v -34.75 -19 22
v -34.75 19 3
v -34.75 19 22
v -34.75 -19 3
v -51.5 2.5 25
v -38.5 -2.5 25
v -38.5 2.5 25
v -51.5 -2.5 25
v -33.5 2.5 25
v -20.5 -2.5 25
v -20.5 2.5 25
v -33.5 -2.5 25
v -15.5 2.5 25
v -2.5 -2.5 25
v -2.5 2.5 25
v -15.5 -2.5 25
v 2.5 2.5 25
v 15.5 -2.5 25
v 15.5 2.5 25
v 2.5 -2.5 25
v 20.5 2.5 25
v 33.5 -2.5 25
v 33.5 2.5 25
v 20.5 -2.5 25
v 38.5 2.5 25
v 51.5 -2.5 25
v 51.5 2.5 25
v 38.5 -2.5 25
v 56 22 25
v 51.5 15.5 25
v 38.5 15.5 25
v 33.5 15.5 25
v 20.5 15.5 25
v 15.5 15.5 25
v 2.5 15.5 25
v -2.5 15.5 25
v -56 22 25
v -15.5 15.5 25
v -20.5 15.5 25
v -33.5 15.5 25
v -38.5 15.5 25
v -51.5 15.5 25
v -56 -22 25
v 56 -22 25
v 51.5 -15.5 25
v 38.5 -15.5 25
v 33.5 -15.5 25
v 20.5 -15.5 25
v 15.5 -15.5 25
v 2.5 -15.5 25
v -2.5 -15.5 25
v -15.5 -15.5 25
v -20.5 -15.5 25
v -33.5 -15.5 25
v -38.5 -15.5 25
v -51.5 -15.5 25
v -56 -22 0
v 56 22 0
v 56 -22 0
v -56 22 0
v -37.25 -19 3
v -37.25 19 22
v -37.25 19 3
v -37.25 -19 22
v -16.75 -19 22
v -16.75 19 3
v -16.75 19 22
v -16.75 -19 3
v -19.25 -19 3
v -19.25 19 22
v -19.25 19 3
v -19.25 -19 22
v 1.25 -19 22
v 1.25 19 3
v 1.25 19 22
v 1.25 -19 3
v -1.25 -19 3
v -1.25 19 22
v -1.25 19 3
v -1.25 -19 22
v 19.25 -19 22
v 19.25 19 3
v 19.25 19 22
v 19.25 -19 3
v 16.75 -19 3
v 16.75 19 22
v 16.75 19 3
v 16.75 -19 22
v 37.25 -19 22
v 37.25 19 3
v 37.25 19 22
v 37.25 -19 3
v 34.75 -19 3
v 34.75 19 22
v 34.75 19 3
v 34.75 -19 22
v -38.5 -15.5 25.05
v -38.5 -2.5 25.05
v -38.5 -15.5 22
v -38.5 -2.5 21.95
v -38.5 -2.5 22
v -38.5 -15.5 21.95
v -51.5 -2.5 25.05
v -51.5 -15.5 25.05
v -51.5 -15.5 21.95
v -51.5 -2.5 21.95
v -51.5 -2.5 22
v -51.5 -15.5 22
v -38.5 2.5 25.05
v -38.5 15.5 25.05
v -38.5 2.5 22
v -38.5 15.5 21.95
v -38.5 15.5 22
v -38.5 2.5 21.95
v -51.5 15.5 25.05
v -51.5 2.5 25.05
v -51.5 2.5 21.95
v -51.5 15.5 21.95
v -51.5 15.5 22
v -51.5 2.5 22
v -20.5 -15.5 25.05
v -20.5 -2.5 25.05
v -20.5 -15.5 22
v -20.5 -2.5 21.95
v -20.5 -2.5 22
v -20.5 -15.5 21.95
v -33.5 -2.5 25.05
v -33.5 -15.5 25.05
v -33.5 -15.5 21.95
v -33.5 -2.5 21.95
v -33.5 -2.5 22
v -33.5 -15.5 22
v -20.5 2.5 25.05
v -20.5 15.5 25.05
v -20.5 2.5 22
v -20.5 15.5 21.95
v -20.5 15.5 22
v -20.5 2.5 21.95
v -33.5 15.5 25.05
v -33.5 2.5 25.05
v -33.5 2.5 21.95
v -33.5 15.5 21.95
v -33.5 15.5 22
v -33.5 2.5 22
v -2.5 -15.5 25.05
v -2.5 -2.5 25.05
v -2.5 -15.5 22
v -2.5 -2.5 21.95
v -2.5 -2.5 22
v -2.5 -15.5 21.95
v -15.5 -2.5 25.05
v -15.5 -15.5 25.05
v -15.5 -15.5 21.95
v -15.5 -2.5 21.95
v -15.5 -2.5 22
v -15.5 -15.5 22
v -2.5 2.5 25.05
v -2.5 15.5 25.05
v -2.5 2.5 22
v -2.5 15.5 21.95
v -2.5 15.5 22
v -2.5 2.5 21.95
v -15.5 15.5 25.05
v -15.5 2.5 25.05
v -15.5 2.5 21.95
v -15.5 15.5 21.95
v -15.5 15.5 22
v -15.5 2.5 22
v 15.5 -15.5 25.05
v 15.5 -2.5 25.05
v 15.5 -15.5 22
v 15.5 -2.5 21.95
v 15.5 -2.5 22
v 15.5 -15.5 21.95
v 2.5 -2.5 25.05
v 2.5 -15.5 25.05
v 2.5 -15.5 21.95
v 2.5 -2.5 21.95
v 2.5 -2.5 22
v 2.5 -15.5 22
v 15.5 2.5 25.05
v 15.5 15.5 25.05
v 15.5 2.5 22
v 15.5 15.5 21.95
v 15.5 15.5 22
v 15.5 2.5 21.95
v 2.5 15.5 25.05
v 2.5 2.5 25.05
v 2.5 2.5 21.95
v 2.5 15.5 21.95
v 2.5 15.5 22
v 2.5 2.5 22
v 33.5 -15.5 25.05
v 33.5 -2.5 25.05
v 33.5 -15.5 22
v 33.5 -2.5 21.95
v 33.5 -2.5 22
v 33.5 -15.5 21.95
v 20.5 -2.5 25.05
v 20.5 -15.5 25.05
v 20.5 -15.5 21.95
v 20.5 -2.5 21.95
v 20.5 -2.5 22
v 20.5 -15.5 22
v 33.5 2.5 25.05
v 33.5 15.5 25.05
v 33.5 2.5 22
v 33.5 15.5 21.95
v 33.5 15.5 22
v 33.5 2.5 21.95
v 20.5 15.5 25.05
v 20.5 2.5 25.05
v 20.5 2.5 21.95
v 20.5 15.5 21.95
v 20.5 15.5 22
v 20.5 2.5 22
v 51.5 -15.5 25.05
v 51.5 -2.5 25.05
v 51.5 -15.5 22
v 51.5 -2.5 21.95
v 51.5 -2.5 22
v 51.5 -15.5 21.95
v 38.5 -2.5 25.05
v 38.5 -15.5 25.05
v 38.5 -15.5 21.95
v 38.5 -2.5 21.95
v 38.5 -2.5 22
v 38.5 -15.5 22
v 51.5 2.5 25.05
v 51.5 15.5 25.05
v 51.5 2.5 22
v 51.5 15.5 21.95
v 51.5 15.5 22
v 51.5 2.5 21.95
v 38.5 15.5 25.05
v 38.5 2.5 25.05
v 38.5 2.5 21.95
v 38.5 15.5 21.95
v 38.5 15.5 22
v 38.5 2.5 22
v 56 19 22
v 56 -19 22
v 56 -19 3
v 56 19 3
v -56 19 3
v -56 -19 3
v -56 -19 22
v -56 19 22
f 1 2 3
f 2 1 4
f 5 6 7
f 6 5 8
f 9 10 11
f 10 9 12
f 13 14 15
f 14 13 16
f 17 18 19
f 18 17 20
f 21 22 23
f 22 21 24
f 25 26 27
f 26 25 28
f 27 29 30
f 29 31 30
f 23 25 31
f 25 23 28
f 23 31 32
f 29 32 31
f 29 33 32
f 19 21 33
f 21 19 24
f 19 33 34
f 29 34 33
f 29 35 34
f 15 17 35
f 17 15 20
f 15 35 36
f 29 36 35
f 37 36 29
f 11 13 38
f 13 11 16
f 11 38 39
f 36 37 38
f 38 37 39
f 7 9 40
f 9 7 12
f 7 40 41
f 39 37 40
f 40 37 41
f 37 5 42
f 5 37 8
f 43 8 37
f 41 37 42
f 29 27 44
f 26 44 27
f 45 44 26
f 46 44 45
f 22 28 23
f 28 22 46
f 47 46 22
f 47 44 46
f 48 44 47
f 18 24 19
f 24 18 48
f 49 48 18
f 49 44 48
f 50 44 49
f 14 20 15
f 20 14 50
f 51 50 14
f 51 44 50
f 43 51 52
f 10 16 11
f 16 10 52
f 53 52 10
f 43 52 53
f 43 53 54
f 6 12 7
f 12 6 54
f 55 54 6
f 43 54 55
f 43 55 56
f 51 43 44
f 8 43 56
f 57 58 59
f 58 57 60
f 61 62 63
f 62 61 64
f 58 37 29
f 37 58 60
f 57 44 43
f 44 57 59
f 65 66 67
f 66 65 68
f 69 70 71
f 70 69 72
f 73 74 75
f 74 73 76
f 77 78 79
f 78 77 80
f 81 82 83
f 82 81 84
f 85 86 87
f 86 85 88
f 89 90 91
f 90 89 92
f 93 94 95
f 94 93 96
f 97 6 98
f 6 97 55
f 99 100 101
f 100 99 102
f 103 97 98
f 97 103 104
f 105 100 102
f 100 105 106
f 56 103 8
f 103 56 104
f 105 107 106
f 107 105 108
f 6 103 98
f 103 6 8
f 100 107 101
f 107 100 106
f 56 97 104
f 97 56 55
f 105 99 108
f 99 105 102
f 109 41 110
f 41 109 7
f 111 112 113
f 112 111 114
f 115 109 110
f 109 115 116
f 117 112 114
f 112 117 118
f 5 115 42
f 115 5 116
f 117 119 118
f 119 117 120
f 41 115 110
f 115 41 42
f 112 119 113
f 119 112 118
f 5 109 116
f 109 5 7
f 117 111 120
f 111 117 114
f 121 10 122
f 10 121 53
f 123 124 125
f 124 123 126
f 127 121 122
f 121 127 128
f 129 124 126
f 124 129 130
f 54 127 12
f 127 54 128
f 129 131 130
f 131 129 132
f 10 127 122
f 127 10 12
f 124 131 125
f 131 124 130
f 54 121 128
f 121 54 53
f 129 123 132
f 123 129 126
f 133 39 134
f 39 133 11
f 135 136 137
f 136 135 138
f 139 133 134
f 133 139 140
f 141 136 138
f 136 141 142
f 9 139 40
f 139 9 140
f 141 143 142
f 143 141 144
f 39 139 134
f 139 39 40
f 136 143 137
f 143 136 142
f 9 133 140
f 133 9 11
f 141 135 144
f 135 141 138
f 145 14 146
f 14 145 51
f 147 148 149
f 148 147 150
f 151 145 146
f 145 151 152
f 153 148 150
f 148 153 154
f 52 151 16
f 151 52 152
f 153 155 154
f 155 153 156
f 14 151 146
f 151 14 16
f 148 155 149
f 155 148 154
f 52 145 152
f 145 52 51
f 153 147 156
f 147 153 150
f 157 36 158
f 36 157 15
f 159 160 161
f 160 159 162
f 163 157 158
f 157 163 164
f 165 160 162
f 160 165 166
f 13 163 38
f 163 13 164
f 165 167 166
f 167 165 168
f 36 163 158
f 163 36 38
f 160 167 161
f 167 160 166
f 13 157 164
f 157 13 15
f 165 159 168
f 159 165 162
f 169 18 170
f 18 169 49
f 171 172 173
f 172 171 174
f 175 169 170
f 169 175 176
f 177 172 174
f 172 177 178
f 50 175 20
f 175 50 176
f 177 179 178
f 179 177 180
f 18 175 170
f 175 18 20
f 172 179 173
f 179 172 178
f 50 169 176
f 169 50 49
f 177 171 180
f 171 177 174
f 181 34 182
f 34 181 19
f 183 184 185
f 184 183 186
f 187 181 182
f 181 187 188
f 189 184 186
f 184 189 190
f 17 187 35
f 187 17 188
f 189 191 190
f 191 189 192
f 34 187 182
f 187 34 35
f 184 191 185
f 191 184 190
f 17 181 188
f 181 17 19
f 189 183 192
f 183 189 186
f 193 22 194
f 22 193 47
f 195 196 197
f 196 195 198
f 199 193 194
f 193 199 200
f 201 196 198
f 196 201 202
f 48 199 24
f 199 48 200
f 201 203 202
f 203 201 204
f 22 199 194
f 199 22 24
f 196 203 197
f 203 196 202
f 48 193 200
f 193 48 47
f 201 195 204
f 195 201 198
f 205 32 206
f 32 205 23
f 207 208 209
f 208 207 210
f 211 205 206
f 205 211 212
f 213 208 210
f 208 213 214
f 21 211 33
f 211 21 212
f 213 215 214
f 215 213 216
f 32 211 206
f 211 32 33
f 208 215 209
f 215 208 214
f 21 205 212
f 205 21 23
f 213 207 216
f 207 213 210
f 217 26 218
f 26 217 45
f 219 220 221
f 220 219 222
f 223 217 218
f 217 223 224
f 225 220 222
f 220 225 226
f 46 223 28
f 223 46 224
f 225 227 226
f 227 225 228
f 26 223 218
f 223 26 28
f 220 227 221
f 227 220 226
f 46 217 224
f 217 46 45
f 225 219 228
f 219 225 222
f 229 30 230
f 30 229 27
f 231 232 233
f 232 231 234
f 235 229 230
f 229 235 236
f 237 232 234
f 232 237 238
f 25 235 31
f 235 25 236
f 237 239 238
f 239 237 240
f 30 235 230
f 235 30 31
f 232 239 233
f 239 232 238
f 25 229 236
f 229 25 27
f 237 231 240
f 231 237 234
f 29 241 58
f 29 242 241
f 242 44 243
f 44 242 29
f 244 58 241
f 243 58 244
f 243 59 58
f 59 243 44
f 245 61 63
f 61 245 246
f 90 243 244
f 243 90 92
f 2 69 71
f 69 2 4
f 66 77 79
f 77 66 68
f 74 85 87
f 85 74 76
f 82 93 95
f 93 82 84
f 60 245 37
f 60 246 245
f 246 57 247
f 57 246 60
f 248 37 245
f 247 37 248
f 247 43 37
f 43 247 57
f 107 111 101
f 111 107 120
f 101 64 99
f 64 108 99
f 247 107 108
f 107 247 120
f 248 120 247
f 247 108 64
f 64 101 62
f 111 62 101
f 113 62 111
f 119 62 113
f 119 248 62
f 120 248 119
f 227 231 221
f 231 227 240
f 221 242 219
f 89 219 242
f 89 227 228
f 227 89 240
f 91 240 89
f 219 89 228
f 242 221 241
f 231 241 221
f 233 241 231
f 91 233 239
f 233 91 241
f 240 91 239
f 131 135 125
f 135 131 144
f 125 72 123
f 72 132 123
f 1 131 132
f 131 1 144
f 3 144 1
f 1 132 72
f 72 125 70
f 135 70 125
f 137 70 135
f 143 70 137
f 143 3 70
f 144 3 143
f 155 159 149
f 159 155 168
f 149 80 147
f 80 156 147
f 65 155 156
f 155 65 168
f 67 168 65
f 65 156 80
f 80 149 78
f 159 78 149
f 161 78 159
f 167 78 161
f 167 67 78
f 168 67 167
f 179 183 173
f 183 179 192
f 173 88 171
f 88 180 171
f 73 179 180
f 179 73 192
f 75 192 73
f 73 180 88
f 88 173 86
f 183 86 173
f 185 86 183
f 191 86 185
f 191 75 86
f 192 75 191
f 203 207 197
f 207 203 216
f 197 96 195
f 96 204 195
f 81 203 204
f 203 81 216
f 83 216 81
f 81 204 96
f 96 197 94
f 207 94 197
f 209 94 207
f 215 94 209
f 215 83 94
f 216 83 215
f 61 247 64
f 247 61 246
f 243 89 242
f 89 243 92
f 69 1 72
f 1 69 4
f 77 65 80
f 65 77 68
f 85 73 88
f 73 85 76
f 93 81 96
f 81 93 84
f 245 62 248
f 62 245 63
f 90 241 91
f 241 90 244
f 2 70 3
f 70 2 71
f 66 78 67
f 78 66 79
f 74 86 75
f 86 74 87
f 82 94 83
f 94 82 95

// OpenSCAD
// Cuvette Rack Dimensions
base_x = 112;
base_y = 44;
base_z = 3;
deck_z_start = 22;
deck_z_end = 25;
deck_thickness = deck_z_end - deck_z_start;
wall_thickness_end = 3;
wall_thickness_rib = 2.5;
wall_height = 25;
rib_positions = [-36, -18, 0, 18, 36];
hole_size = 13;
hole_spacing = 18;
num_holes_x = 6;
num_holes_y = 2;

// Render settings
$fn = 64;

// Base Plate (z = 0 to 3)
translate([0, 0, base_z/2])
    cube([base_x, base_y, base_z], center = true);

// Deck Plate (z = 22 to 25)
translate([0, 0, deck_z_start + deck_thickness/2])
    cube([base_x, base_y, deck_thickness], center = true);

// End Walls (flush with short ends, Y direction)
// Left end wall at y = -base_y/2
translate([0, -base_y/2 + wall_thickness_end/2, wall_height/2])
    cube([base_x, wall_thickness_end, wall_height], center = true);

// Right end wall at y = base_y/2
translate([0, base_y/2 - wall_thickness_end/2, wall_height/2])
    cube([base_x, wall_thickness_end, wall_height], center = true);

// Ribs (5 ribs at specified X positions)
for (x_pos = rib_positions) {
    translate([x_pos, 0, wall_height/2])
        cube([wall_thickness_rib, base_y, wall_height], center = true);
}

// Holes in Deck Plate
// 2 rows along Y, 6 columns along X
// Centred on deck, 18 mm spacing
for (i = [0 : num_holes_x - 1]) {
    for (j = [0 : num_holes_y - 1]) {
        x_offset = (i - (num_holes_x - 1) / 2) * hole_spacing;
        y_offset = (j - (num_holes_y - 1) / 2) * hole_spacing;
        
        translate([x_offset, y_offset, deck_z_start + deck_thickness/2])
            cube([hole_size, hole_size, deck_thickness + 0.1], center = true);
    }
}
